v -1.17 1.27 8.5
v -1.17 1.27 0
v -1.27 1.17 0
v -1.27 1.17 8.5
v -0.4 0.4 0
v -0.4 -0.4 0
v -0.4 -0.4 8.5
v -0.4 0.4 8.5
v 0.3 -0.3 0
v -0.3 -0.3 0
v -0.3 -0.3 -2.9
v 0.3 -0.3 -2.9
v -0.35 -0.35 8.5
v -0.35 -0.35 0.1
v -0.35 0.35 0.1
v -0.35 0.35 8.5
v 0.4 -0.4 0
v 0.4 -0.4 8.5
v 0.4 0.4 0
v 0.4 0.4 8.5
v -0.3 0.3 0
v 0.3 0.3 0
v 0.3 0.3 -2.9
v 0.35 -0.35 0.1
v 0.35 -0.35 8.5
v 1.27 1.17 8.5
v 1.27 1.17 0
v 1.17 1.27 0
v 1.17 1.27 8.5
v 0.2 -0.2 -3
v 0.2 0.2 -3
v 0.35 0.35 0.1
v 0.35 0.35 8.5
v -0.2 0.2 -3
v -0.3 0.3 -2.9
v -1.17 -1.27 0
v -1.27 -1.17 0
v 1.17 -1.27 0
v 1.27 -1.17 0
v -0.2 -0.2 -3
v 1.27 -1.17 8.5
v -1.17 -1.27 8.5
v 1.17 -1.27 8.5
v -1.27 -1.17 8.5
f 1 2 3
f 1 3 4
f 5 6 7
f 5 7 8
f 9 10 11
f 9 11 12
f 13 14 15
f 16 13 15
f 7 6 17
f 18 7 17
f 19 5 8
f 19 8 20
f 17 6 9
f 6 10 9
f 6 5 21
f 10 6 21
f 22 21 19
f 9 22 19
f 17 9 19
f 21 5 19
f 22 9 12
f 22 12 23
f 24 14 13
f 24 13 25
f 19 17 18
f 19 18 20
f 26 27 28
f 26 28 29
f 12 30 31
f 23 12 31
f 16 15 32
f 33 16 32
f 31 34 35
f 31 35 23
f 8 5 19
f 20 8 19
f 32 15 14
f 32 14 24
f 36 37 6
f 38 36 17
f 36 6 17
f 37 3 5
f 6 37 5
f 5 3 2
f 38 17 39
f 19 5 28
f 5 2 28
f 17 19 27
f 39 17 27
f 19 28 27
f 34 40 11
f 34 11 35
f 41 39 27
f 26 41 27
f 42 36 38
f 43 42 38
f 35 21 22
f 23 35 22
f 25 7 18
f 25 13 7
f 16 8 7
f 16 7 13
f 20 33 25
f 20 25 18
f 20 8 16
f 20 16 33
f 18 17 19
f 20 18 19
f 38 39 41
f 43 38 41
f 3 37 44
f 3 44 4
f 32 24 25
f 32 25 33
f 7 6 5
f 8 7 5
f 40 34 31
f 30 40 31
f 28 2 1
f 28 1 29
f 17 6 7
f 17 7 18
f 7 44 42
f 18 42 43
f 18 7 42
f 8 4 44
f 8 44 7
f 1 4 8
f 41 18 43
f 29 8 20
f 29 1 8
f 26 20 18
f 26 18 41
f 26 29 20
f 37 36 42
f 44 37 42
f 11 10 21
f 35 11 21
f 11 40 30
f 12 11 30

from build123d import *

# Parameters (mm, degrees)
F0_W          = 2.54
F0_H          = 2.54
F0_W_2        = 0.8
F0_H_2        = 0.8
F1_DEPTH      = 8.5
F2_SIZE       = 0.1
F3_W          = 0.8
F3_H          = 0.8
F3_W_2        = 0.7
F3_H_2        = 0.7
F4_DEPTH      = 8.5
F3_W_3        = 0.6
F3_H_3        = 0.6
F5_DEPTH      = 0.1
F6_DEPTH      = 3
F6_DEPTH_BACK = 0.1
F7_SIZE       = 0.1


with BuildPart() as f1:
    # F0 (on Top) → F1 (new body)
    with BuildSketch(Plane.XY):
        Rectangle(F0_W, F0_H)
        Rectangle(F0_W_2, F0_H_2, mode=Mode.SUBTRACT)
    extrude(amount=F1_DEPTH)

    # F2
    f2_edges = [f1.edges().sort_by_distance(p)[0] for p in [
        (1.27, -1.27, 4.25),
        (-1.27, -1.27, 4.25),
        (-1.27, 1.27, 4.25),
        (1.27, 1.27, 4.25),
    ]]
    chamfer(f2_edges, length=F2_SIZE)


with BuildPart() as f4:
    # F3 (on Top) → F4 (new body, through all)
    with BuildSketch(Plane.XY):
        Rectangle(F3_W, F3_H)
        Rectangle(F3_W_2, F3_H_2, mode=Mode.SUBTRACT)
    extrude(amount=F4_DEPTH)

    # F3 (on Top) → F5 (join)
    with BuildSketch(Plane.XY):
        Rectangle(F3_W_2, F3_H_2)
        Rectangle(F3_W_3, F3_H_3, mode=Mode.SUBTRACT)
    extrude(amount=F5_DEPTH)

    # F3 (on Top) → F6 (join, two sides)
    with BuildSketch(Plane.XY) as f6_sk:
        Rectangle(F3_W_3, F3_H_3)
    extrude(amount=-F6_DEPTH)
    extrude(f6_sk.sketch, amount=F6_DEPTH_BACK)

    # F7
    f7_edges = [f4.edges().sort_by_distance(p)[0] for p in [
        (0.3, 0, -3),
        (0, 0.3, -3),
        (-0.3, 0, -3),
        (0, -0.3, -3),
    ]]
    chamfer(f7_edges, length=F7_SIZE)


solid = Compound([f1.part, f4.part])
